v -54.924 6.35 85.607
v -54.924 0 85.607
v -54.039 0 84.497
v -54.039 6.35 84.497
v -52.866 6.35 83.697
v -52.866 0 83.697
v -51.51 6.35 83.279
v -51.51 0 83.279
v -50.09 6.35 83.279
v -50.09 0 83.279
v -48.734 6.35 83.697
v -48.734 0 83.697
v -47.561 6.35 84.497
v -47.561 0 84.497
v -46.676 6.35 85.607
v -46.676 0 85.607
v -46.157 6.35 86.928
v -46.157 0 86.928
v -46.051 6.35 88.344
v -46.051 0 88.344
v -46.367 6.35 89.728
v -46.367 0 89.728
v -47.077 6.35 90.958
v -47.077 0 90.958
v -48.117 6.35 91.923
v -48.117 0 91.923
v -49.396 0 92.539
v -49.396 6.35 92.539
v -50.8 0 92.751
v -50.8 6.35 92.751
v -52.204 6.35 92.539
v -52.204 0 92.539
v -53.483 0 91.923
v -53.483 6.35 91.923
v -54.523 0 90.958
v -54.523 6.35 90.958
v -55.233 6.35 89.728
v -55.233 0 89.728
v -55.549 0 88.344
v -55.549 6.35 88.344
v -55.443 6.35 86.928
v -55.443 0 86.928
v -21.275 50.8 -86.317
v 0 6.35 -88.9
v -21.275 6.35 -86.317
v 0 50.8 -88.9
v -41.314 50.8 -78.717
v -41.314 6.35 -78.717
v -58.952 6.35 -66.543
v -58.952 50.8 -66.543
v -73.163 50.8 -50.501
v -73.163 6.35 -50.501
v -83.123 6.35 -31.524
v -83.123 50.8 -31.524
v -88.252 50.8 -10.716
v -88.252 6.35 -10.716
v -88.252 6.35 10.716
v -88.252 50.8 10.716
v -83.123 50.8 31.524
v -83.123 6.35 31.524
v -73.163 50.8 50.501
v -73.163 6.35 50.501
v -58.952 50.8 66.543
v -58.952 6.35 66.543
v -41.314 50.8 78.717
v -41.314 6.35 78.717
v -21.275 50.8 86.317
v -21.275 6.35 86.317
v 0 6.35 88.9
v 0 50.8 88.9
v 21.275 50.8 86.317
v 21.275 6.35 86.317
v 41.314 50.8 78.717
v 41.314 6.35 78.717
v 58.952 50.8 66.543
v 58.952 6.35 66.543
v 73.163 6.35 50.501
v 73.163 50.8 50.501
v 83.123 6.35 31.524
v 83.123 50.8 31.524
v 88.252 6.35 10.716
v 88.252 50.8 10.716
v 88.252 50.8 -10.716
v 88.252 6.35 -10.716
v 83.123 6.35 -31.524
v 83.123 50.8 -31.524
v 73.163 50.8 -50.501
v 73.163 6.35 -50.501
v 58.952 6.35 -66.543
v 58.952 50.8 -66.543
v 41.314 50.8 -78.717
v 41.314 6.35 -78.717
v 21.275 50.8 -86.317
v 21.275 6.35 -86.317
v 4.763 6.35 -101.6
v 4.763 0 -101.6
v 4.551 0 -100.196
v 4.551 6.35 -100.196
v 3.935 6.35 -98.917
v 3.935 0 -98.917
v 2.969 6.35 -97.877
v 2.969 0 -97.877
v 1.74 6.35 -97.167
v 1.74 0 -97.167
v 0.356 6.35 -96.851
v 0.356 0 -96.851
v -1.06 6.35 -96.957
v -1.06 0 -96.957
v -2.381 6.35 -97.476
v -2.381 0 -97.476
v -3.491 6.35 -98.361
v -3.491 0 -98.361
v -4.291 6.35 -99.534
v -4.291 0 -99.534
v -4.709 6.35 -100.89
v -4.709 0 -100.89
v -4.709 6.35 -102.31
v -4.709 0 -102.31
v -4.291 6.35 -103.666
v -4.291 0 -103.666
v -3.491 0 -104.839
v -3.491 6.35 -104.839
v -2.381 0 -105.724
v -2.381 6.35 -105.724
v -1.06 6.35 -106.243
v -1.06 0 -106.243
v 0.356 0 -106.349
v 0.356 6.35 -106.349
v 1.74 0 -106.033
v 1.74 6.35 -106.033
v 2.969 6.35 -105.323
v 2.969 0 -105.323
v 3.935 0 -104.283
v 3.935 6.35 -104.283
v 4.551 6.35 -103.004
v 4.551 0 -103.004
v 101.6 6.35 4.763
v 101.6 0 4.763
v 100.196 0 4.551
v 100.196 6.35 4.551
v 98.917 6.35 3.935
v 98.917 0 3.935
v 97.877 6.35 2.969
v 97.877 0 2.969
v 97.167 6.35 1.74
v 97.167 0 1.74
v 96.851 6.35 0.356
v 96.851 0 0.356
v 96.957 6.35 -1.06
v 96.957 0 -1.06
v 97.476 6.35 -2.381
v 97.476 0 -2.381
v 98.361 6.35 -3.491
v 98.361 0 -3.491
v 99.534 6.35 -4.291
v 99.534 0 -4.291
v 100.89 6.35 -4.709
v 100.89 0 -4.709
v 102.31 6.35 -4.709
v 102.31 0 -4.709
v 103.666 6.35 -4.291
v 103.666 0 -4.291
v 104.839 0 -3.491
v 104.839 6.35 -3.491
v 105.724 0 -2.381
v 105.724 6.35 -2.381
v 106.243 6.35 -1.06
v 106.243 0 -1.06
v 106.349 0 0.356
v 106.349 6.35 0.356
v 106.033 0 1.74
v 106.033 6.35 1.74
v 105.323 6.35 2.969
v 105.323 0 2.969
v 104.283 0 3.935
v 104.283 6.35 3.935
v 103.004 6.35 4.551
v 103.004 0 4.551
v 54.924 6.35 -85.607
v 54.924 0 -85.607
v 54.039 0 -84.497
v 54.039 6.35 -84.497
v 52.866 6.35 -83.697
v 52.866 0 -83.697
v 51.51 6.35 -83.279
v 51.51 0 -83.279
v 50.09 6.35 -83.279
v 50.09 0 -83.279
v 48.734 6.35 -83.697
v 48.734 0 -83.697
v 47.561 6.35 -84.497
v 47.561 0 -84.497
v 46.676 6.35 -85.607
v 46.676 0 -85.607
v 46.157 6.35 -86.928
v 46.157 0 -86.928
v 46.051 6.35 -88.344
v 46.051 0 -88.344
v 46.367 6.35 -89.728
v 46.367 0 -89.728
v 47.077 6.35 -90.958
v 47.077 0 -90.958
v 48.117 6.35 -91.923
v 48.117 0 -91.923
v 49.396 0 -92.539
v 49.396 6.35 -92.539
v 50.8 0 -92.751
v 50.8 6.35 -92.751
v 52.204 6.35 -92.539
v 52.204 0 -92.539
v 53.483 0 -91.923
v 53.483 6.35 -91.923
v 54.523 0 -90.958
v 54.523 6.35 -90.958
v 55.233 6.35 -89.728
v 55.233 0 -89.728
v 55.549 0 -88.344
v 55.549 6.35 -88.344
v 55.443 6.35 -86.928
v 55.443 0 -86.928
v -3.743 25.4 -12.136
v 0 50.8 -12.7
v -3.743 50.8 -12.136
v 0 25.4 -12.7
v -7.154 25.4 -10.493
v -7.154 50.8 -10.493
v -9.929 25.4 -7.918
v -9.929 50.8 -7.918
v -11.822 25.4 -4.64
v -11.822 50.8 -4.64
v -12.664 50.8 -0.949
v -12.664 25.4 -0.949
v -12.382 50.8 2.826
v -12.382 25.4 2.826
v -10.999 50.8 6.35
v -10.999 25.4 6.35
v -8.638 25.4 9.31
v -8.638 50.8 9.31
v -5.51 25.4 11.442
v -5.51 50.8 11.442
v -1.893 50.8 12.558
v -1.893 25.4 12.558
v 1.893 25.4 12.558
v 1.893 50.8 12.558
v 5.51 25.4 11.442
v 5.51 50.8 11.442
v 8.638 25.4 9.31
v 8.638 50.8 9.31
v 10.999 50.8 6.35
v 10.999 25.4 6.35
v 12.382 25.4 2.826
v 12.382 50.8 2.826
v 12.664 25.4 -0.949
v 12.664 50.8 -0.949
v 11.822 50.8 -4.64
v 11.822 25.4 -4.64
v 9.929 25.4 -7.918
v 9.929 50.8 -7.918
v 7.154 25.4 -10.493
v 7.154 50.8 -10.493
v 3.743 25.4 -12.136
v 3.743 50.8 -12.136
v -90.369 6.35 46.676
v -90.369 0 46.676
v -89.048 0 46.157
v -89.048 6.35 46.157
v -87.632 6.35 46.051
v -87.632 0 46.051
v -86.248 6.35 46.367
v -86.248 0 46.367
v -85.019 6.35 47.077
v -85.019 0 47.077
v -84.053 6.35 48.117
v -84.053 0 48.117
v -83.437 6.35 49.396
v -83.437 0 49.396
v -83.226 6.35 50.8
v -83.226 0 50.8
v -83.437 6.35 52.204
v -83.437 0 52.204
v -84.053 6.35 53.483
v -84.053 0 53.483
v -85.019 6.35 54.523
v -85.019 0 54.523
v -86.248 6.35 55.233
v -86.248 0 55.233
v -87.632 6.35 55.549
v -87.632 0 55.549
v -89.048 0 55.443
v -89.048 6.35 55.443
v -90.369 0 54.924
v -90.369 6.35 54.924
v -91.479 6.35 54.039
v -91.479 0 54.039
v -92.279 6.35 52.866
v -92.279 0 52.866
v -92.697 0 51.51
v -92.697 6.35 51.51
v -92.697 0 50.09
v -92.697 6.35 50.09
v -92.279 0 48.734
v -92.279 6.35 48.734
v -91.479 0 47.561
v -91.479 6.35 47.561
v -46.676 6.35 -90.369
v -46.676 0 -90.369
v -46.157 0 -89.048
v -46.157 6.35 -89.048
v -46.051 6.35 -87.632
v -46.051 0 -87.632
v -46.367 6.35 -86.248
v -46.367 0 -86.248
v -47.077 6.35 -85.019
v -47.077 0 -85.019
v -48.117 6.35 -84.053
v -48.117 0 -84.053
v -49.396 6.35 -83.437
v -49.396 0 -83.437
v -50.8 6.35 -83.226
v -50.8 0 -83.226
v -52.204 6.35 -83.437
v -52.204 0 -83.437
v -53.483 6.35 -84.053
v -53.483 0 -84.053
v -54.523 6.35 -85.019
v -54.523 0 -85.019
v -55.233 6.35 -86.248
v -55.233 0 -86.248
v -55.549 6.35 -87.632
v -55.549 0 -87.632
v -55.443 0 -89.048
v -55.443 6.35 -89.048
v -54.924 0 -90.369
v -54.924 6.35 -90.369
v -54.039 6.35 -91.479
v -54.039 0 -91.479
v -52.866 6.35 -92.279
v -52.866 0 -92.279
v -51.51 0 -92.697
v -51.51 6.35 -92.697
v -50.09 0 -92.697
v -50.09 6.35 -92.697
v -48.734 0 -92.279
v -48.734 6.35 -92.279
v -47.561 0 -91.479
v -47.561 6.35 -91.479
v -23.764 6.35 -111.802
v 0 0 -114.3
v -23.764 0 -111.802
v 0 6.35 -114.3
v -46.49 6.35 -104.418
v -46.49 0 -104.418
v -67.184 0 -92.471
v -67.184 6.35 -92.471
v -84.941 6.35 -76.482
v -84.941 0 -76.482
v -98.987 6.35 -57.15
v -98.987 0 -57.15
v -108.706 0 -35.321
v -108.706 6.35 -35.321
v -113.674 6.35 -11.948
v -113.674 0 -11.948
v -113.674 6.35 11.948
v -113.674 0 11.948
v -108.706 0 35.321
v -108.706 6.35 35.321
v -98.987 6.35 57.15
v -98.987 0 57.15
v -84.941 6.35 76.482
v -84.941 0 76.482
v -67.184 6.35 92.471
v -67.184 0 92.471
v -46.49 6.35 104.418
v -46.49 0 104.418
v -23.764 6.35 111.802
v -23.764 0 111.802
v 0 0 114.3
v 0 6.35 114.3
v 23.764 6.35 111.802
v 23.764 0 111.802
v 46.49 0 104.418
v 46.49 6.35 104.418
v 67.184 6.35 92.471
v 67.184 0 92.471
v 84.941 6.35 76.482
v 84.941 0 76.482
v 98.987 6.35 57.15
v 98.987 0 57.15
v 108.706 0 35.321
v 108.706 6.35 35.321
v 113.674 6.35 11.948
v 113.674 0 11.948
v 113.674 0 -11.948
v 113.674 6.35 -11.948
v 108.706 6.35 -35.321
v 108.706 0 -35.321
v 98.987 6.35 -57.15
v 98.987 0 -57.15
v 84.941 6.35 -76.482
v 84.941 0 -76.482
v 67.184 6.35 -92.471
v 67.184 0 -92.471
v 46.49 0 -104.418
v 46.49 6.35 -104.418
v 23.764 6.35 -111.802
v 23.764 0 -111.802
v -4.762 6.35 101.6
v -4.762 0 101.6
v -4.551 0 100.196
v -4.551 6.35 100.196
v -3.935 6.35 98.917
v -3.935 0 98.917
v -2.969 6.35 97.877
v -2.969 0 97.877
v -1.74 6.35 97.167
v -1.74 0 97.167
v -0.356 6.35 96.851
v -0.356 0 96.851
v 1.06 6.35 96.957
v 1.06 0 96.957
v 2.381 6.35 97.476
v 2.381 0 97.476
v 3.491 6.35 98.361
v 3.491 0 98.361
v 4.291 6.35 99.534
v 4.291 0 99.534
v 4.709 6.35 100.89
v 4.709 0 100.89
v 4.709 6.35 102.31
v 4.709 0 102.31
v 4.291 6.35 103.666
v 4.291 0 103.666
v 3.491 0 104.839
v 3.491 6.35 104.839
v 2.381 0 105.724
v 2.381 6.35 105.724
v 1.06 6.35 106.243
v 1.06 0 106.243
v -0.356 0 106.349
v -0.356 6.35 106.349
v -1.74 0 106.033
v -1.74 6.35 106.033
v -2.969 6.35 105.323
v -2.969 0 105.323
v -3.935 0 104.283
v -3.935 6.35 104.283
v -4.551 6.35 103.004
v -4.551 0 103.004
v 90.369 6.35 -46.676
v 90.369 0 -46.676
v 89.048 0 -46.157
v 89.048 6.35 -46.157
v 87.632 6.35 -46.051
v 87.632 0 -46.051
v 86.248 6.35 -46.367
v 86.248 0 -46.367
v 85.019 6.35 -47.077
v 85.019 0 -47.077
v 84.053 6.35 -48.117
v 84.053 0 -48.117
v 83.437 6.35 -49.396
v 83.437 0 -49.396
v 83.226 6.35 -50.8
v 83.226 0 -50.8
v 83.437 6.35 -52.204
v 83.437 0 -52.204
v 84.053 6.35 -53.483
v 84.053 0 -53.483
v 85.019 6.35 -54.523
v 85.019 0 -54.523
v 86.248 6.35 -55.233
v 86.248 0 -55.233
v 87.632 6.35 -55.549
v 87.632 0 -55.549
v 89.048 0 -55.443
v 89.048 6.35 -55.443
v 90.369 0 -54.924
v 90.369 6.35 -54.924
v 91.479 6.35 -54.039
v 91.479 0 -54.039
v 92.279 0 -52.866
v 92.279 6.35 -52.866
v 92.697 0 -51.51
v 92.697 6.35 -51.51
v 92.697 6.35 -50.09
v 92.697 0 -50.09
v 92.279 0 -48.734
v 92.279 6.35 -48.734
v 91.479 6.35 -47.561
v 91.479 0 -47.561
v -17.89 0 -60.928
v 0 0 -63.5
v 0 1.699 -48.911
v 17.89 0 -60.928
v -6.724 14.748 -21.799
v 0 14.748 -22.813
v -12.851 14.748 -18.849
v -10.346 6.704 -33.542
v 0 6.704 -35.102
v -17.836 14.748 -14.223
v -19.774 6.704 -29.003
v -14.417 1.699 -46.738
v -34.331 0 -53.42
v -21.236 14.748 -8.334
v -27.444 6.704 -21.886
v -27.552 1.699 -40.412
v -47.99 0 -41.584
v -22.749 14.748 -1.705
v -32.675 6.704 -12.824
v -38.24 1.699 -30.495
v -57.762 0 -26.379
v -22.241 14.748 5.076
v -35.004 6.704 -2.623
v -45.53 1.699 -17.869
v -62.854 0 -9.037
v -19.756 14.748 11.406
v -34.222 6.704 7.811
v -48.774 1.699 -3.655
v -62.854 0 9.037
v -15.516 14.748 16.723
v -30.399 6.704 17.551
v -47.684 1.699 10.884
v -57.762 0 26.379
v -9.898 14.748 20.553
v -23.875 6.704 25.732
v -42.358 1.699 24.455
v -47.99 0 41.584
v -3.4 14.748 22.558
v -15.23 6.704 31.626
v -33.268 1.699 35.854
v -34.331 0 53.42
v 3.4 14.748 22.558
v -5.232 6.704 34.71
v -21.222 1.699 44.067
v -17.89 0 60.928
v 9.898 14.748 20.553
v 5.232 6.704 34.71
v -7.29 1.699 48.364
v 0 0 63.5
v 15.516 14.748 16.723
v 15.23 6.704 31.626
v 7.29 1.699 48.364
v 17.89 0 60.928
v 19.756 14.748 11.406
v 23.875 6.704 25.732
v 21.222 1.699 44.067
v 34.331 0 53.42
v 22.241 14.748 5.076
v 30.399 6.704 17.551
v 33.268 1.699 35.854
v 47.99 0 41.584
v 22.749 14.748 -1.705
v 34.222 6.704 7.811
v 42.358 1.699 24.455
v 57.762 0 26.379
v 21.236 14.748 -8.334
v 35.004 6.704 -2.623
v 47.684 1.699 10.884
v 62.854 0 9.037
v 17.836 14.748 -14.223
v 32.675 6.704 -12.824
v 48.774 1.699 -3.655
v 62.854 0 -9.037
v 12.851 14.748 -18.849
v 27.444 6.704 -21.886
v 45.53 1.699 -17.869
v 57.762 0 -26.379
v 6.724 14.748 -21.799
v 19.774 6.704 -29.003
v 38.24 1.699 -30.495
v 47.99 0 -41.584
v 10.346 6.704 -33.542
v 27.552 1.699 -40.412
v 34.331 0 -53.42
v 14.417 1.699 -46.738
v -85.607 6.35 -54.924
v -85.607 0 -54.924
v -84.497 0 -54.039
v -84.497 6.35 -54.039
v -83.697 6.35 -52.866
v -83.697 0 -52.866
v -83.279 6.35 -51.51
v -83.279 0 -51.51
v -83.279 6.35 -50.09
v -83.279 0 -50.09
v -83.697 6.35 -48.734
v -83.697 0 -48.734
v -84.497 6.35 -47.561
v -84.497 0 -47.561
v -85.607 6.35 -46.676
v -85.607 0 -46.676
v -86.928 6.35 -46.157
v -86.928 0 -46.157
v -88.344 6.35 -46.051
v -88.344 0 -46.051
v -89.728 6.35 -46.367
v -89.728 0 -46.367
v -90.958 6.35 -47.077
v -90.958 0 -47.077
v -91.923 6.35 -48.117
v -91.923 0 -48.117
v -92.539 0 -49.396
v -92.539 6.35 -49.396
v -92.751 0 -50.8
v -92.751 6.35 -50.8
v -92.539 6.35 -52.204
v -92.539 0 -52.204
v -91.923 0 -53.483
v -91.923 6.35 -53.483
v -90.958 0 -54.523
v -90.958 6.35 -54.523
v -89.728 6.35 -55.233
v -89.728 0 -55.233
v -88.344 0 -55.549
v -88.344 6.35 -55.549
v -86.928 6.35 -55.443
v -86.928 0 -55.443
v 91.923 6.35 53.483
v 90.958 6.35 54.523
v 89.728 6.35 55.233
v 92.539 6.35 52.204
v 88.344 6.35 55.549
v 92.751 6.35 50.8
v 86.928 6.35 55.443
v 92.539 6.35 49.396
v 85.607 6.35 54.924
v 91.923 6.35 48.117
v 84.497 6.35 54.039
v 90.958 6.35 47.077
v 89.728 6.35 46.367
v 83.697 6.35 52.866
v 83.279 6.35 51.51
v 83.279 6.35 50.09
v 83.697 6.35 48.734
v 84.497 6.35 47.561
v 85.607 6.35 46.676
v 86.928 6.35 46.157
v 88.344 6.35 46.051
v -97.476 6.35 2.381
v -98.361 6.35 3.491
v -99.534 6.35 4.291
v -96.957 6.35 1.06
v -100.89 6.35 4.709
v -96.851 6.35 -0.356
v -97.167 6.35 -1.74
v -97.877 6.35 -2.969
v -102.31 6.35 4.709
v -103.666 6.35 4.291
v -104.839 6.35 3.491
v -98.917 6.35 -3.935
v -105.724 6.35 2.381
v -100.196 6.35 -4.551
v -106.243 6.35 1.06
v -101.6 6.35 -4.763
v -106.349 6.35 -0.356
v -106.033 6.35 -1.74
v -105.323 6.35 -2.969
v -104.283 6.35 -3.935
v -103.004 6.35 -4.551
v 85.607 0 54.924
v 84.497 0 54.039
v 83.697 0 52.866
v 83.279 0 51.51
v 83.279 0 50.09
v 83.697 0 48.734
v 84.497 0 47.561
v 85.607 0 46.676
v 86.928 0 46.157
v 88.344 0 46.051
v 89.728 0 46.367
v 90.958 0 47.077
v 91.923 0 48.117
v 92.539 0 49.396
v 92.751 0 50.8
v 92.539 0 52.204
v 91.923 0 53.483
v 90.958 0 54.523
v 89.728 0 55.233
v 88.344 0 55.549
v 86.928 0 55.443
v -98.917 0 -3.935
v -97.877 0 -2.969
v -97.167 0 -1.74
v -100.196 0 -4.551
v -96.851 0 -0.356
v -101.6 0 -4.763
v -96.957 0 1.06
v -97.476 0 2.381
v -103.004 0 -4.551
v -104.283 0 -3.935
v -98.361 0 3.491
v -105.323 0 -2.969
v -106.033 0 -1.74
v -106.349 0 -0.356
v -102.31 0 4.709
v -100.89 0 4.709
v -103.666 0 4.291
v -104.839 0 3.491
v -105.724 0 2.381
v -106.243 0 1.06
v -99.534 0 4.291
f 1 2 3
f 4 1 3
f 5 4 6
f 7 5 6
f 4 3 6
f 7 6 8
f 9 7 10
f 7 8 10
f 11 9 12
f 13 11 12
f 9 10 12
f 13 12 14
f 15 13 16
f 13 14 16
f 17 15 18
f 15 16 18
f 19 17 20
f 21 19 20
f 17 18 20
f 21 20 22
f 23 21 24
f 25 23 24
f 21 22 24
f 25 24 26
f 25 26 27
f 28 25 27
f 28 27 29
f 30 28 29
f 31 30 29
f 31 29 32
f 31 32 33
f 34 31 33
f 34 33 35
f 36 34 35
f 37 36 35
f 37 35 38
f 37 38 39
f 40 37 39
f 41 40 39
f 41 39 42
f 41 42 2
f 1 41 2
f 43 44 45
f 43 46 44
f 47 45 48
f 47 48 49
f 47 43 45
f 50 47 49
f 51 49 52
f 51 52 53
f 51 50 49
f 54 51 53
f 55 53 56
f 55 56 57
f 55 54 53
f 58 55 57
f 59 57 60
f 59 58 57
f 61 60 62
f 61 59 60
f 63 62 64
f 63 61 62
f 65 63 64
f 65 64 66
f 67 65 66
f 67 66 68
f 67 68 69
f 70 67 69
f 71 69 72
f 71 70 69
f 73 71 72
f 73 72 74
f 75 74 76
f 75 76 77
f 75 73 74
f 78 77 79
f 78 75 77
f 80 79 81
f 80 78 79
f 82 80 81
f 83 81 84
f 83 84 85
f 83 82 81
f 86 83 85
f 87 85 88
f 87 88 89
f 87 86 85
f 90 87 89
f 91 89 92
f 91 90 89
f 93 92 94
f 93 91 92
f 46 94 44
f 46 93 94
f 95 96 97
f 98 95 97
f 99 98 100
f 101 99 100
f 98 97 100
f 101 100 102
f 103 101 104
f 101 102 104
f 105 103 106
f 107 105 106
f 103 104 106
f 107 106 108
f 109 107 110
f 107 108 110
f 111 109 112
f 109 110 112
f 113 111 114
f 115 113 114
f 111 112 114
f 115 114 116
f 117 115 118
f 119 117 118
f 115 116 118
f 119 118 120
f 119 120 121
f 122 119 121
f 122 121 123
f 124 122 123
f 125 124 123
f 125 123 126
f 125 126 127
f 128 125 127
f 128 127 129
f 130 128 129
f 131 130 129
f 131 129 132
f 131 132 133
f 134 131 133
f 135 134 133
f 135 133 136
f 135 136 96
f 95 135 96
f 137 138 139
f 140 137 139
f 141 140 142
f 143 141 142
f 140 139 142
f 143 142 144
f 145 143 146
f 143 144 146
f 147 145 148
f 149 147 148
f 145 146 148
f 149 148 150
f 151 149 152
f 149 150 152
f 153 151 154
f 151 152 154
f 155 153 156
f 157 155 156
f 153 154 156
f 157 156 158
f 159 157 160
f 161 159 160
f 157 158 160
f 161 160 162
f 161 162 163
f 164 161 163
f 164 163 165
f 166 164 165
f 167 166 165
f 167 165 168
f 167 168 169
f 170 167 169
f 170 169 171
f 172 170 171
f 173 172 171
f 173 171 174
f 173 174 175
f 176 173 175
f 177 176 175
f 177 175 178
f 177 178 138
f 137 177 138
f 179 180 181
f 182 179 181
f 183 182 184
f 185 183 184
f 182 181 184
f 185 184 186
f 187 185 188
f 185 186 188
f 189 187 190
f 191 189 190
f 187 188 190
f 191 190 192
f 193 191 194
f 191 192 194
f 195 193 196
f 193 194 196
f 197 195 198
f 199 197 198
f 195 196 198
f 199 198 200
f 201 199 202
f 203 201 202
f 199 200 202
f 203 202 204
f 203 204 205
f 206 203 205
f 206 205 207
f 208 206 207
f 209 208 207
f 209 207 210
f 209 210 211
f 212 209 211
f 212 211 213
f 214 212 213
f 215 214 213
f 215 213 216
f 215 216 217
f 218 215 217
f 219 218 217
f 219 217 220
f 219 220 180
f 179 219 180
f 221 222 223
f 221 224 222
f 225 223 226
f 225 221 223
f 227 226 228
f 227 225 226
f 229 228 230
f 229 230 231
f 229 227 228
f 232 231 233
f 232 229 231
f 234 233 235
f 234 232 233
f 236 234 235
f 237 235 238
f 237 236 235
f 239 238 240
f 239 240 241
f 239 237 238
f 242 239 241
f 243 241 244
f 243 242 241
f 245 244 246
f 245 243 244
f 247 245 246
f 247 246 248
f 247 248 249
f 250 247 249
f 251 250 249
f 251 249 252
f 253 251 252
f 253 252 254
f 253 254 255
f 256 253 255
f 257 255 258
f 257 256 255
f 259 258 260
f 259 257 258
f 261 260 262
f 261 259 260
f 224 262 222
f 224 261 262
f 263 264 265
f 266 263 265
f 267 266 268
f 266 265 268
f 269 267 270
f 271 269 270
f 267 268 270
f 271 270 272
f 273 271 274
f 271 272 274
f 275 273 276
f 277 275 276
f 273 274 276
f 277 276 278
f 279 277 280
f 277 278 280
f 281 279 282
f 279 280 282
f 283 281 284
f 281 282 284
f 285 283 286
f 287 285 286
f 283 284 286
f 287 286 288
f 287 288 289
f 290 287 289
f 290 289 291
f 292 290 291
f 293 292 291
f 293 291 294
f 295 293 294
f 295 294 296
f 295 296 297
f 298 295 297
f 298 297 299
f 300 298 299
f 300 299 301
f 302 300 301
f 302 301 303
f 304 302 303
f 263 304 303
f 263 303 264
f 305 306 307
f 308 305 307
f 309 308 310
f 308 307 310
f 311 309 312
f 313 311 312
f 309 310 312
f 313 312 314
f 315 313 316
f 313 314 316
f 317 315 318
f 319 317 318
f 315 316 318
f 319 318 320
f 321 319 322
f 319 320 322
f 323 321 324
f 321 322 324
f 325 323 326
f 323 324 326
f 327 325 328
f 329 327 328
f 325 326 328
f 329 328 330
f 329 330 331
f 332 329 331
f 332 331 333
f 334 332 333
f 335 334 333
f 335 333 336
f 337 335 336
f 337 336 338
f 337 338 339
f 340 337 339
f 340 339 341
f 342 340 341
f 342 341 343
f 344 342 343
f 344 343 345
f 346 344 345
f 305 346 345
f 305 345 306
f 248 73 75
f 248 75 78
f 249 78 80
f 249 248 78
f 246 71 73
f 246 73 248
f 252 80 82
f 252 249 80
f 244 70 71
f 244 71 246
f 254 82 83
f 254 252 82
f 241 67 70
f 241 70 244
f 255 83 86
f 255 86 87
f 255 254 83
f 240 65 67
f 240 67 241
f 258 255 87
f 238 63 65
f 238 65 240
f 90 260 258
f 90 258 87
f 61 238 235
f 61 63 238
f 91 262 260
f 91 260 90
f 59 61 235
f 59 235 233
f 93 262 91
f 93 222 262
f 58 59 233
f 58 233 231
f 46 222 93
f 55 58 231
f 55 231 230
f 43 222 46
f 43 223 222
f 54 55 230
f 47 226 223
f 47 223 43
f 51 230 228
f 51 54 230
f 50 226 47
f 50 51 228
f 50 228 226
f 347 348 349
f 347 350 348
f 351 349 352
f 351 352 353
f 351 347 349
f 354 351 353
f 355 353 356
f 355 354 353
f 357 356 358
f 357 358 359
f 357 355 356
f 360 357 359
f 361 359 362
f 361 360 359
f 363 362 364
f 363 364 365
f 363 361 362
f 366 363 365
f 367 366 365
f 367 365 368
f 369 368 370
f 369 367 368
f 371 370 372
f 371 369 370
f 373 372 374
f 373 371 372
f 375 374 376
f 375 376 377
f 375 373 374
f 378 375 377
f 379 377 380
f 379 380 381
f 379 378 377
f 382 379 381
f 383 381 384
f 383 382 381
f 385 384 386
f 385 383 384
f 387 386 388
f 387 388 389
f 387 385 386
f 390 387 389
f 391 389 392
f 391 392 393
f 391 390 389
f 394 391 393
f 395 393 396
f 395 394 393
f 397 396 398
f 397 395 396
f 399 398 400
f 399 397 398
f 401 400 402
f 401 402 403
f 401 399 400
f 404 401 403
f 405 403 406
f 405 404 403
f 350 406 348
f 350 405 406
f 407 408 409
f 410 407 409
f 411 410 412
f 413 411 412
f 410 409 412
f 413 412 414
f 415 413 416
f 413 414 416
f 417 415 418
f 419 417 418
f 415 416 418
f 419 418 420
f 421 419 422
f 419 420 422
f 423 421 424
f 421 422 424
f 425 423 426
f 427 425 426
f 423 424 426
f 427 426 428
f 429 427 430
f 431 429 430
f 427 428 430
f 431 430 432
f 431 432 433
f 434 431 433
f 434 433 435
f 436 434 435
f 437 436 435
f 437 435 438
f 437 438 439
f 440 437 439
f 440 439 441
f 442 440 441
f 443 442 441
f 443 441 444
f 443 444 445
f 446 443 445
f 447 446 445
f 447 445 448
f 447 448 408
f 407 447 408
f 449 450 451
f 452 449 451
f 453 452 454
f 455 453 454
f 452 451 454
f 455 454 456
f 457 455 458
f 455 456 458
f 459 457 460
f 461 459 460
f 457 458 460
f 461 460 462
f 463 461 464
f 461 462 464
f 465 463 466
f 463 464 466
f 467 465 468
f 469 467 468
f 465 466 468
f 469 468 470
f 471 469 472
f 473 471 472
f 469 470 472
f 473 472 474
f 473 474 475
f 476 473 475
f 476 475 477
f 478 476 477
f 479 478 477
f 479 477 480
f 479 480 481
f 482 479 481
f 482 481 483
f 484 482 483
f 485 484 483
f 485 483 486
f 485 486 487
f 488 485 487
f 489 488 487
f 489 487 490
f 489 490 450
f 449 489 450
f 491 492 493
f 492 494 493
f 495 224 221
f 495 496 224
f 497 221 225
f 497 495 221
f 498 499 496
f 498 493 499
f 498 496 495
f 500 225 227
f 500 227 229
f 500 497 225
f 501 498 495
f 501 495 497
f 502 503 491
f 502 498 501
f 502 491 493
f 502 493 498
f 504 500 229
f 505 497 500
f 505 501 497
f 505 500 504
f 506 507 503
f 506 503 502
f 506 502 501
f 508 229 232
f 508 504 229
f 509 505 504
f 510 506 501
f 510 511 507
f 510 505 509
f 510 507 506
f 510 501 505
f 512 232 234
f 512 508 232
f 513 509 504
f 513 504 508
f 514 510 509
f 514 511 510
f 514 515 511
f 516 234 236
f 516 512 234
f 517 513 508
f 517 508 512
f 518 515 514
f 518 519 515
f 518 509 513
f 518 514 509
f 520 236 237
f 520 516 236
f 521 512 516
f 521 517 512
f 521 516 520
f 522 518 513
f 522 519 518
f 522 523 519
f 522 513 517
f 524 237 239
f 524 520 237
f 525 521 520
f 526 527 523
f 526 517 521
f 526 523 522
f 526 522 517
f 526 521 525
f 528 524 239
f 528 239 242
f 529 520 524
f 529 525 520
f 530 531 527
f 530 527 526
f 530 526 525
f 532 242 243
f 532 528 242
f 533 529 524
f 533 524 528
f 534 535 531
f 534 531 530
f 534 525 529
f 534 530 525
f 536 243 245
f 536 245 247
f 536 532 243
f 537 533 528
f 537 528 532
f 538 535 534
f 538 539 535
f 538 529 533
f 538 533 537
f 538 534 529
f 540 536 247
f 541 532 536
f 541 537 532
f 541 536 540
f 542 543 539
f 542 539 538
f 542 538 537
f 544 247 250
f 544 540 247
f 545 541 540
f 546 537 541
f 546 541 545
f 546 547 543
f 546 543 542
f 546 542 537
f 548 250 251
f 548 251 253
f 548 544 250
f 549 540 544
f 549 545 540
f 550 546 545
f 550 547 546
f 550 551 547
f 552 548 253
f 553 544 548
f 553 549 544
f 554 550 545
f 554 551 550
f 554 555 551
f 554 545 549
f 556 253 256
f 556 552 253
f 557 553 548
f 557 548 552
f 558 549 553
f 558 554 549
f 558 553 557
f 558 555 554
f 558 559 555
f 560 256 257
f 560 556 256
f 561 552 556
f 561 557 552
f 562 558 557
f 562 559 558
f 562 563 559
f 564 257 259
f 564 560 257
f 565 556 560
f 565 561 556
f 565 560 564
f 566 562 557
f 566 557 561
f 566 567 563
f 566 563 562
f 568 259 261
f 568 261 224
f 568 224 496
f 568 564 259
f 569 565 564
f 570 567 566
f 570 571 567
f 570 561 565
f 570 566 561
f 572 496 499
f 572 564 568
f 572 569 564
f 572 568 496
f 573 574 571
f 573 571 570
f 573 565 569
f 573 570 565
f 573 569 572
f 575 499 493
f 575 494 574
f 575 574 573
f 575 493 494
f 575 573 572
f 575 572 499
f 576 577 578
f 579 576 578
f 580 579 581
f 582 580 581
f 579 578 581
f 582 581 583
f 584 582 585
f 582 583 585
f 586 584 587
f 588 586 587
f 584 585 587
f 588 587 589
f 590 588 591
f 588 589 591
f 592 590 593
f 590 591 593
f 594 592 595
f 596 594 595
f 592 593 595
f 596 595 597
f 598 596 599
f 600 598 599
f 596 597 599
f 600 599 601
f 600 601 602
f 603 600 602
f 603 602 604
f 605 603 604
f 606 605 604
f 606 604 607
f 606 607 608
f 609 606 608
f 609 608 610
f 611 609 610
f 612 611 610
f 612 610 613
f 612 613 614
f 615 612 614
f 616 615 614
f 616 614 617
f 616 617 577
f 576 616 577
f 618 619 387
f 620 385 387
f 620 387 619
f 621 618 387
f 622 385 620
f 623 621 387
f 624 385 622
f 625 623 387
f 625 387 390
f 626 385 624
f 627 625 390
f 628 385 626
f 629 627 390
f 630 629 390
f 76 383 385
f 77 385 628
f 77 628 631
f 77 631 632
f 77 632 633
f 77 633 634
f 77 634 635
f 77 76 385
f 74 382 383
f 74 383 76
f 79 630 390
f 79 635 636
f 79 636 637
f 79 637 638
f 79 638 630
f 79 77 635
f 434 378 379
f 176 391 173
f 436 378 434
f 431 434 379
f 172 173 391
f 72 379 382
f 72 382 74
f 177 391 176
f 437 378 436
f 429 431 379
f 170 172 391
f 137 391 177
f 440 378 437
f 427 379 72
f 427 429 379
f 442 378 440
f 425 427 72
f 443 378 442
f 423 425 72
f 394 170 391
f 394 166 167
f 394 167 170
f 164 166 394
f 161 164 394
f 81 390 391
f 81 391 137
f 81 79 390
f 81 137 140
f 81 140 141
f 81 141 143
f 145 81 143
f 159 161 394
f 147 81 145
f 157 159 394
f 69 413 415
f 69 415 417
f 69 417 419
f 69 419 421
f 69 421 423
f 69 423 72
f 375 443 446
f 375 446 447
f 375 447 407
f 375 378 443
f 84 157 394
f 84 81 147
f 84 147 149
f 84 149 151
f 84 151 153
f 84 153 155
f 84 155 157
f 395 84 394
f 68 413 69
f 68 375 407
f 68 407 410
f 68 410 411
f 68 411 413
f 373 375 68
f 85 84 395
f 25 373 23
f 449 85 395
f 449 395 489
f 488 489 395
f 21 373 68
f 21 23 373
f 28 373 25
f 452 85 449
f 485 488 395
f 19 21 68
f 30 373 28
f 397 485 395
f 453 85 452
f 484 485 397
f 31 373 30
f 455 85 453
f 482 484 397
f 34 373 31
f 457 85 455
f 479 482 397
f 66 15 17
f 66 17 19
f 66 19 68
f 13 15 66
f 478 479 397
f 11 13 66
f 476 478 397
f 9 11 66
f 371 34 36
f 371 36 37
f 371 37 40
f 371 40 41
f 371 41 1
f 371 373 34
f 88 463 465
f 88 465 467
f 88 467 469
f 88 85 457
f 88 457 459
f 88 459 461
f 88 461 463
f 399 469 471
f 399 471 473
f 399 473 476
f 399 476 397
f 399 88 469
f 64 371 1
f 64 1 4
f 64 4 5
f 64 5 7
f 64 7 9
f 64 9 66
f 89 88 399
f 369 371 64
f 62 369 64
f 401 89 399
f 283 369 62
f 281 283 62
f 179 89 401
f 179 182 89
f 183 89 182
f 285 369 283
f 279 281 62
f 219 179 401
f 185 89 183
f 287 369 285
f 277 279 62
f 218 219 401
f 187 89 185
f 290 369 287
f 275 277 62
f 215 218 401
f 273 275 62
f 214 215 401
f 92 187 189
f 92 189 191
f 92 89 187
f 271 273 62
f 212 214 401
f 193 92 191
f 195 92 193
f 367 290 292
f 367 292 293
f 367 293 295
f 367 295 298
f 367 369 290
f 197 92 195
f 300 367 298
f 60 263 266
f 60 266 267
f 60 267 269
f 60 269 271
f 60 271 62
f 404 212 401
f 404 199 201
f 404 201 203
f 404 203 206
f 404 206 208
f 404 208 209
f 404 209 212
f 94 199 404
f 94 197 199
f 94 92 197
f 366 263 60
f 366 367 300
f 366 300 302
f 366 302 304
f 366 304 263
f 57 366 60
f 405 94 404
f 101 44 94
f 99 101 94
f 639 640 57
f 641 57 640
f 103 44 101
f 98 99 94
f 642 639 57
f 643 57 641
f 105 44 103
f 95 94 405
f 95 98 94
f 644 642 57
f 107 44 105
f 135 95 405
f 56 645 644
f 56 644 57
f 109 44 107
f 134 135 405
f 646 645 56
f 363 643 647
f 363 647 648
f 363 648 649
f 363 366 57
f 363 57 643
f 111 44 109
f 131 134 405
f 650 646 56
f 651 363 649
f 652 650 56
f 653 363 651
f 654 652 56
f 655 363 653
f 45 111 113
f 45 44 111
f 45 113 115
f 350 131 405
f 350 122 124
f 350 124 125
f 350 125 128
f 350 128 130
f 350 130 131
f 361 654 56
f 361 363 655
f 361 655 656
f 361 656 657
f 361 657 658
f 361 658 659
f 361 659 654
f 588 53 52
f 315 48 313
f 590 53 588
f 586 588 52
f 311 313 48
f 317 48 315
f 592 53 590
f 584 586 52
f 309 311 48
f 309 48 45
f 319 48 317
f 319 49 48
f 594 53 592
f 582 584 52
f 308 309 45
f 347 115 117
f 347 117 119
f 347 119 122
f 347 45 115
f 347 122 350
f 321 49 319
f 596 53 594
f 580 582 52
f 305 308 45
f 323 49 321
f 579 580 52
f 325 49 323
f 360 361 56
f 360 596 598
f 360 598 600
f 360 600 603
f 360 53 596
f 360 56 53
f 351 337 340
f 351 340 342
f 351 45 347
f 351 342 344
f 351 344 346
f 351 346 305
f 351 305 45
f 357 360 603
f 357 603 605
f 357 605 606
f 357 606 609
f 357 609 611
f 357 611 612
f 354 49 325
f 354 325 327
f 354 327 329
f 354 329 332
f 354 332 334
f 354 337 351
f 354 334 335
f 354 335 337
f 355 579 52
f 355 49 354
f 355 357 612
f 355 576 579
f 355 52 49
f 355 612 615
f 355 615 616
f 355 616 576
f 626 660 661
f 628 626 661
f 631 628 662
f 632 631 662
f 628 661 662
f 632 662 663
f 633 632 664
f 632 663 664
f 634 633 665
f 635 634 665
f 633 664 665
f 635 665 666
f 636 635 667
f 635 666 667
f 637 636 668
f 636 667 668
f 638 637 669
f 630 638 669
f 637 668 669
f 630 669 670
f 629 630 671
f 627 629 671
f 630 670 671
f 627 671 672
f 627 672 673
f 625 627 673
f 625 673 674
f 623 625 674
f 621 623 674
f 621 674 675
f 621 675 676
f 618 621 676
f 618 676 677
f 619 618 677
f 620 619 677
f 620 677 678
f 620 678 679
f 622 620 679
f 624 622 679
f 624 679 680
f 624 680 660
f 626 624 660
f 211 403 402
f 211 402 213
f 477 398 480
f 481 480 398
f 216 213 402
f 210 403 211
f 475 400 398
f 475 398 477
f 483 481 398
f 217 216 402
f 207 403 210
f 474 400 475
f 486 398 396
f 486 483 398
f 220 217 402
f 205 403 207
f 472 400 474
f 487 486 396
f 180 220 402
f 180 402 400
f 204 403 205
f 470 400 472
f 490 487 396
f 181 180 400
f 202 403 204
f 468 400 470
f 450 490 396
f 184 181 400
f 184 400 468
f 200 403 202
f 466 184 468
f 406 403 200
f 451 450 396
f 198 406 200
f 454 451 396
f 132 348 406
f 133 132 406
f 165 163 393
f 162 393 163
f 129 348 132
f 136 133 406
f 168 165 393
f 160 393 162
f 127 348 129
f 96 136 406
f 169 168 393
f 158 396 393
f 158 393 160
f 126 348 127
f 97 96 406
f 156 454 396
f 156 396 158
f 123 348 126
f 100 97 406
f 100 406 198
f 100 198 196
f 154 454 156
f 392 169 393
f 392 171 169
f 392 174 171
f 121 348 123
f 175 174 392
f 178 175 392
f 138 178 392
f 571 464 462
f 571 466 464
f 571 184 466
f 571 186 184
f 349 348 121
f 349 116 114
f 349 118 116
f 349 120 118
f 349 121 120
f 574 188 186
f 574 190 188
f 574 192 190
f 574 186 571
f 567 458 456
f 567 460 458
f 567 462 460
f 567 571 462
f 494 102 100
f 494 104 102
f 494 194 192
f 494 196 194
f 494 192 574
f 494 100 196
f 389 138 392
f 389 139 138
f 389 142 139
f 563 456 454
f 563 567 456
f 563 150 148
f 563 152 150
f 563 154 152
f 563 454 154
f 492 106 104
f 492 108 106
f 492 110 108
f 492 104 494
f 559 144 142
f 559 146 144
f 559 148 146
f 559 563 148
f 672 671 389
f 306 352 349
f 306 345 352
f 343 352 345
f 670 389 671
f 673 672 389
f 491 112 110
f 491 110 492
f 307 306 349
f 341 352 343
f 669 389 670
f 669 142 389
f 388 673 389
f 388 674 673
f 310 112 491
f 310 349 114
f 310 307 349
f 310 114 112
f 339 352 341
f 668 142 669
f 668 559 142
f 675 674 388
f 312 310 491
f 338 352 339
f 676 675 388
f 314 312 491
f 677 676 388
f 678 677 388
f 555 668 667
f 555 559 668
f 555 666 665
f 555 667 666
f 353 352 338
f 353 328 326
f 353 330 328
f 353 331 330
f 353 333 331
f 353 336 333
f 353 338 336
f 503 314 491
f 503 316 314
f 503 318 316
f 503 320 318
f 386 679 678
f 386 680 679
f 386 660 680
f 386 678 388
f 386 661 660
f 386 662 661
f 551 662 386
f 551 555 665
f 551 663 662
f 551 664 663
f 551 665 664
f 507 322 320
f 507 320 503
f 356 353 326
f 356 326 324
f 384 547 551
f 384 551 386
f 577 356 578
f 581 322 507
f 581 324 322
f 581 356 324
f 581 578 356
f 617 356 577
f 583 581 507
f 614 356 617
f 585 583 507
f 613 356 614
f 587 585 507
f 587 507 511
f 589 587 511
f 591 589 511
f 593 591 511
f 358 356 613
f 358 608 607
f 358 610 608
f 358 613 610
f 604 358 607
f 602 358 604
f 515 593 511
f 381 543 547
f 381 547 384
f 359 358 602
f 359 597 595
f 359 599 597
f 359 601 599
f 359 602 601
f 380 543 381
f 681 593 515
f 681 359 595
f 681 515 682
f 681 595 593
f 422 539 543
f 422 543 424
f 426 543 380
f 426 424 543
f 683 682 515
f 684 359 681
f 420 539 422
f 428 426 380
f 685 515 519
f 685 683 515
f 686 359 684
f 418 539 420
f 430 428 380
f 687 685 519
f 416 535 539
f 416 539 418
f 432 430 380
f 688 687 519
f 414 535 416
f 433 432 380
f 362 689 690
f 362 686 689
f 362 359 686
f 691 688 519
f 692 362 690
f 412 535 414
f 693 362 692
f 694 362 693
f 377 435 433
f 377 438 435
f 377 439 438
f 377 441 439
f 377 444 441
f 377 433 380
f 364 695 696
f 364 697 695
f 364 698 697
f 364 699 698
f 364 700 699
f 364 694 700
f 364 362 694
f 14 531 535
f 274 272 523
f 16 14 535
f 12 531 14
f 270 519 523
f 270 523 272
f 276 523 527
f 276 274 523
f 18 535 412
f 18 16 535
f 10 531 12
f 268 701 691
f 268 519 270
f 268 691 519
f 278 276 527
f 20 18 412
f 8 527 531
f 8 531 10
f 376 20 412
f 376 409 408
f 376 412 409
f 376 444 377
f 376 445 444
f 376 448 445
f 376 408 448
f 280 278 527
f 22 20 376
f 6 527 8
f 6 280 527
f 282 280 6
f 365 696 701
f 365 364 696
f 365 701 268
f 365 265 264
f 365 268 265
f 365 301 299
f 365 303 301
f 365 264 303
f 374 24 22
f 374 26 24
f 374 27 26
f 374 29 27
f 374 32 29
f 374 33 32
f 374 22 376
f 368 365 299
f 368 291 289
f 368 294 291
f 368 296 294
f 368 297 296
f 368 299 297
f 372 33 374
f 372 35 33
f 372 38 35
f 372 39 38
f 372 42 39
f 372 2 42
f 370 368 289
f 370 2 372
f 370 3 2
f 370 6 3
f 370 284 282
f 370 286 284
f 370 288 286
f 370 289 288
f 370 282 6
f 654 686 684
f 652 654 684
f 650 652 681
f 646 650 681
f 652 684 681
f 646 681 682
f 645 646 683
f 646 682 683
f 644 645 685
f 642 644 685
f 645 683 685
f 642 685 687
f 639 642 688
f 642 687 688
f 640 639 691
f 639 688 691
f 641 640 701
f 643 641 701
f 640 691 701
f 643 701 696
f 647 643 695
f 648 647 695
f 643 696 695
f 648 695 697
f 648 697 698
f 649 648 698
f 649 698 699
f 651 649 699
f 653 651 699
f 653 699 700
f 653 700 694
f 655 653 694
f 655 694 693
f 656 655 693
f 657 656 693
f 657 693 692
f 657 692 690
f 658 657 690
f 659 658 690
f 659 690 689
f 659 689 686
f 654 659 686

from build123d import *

# Parameters (mm, degrees)
F_3_8_0_375_DIAMETER_HOLE2_D = 9.525
CIRPATTERN2_COUNT            = 12


with BuildPart() as part:
    # Sketch1 → Revolve1 (revolve)
    with BuildSketch(Plane.XY, mode=Mode.PRIVATE) as revolve1_sk:
        with BuildLine():
            Line((12.7, 50.8), (12.7, 25.4))
            ThreePointArc((12.7, 25.4), (35.101936686, 6.703873372), (63.5, 0))
            Line((63.5, 0), (114.3, 0))
            Line((114.3, 0), (114.3, 6.35))
            Line((114.3, 6.35), (88.9, 6.35))
            Line((88.9, 6.35), (88.9, 50.8))
            Line((88.9, 50.8), (12.7, 50.8))
        make_face()
    revolve(revolve1_sk.sketch.rotate(Axis((0, 0, 0), (0, 1, 0)), 90), axis=Axis((0, 0, 0), (0, 1, 0)))

    # 3/8 (0.375) Diameter Hole2 (through all)
    with Locations(Plane(origin=(0, 6.35, 0), x_dir=(1, 0, 0), z_dir=(0, 1, 0))):
        with Locations((0, -101.6)):
            f_3_8_0_375_diameter_hole2 = Hole(F_3_8_0_375_DIAMETER_HOLE2_D / 2)

    # CirPattern2: 3/8 (0.375) Diameter Hole2 ×12 about axis, 1 skipped
    cirpattern2_axis = Axis((0, 0, 0), (0, 1, 0))
    add([f_3_8_0_375_diameter_hole2.rotate(cirpattern2_axis, i * 360 / CIRPATTERN2_COUNT) for i in range(1, CIRPATTERN2_COUNT) if i not in (1,)], mode=Mode.SUBTRACT)


solid = part.part
